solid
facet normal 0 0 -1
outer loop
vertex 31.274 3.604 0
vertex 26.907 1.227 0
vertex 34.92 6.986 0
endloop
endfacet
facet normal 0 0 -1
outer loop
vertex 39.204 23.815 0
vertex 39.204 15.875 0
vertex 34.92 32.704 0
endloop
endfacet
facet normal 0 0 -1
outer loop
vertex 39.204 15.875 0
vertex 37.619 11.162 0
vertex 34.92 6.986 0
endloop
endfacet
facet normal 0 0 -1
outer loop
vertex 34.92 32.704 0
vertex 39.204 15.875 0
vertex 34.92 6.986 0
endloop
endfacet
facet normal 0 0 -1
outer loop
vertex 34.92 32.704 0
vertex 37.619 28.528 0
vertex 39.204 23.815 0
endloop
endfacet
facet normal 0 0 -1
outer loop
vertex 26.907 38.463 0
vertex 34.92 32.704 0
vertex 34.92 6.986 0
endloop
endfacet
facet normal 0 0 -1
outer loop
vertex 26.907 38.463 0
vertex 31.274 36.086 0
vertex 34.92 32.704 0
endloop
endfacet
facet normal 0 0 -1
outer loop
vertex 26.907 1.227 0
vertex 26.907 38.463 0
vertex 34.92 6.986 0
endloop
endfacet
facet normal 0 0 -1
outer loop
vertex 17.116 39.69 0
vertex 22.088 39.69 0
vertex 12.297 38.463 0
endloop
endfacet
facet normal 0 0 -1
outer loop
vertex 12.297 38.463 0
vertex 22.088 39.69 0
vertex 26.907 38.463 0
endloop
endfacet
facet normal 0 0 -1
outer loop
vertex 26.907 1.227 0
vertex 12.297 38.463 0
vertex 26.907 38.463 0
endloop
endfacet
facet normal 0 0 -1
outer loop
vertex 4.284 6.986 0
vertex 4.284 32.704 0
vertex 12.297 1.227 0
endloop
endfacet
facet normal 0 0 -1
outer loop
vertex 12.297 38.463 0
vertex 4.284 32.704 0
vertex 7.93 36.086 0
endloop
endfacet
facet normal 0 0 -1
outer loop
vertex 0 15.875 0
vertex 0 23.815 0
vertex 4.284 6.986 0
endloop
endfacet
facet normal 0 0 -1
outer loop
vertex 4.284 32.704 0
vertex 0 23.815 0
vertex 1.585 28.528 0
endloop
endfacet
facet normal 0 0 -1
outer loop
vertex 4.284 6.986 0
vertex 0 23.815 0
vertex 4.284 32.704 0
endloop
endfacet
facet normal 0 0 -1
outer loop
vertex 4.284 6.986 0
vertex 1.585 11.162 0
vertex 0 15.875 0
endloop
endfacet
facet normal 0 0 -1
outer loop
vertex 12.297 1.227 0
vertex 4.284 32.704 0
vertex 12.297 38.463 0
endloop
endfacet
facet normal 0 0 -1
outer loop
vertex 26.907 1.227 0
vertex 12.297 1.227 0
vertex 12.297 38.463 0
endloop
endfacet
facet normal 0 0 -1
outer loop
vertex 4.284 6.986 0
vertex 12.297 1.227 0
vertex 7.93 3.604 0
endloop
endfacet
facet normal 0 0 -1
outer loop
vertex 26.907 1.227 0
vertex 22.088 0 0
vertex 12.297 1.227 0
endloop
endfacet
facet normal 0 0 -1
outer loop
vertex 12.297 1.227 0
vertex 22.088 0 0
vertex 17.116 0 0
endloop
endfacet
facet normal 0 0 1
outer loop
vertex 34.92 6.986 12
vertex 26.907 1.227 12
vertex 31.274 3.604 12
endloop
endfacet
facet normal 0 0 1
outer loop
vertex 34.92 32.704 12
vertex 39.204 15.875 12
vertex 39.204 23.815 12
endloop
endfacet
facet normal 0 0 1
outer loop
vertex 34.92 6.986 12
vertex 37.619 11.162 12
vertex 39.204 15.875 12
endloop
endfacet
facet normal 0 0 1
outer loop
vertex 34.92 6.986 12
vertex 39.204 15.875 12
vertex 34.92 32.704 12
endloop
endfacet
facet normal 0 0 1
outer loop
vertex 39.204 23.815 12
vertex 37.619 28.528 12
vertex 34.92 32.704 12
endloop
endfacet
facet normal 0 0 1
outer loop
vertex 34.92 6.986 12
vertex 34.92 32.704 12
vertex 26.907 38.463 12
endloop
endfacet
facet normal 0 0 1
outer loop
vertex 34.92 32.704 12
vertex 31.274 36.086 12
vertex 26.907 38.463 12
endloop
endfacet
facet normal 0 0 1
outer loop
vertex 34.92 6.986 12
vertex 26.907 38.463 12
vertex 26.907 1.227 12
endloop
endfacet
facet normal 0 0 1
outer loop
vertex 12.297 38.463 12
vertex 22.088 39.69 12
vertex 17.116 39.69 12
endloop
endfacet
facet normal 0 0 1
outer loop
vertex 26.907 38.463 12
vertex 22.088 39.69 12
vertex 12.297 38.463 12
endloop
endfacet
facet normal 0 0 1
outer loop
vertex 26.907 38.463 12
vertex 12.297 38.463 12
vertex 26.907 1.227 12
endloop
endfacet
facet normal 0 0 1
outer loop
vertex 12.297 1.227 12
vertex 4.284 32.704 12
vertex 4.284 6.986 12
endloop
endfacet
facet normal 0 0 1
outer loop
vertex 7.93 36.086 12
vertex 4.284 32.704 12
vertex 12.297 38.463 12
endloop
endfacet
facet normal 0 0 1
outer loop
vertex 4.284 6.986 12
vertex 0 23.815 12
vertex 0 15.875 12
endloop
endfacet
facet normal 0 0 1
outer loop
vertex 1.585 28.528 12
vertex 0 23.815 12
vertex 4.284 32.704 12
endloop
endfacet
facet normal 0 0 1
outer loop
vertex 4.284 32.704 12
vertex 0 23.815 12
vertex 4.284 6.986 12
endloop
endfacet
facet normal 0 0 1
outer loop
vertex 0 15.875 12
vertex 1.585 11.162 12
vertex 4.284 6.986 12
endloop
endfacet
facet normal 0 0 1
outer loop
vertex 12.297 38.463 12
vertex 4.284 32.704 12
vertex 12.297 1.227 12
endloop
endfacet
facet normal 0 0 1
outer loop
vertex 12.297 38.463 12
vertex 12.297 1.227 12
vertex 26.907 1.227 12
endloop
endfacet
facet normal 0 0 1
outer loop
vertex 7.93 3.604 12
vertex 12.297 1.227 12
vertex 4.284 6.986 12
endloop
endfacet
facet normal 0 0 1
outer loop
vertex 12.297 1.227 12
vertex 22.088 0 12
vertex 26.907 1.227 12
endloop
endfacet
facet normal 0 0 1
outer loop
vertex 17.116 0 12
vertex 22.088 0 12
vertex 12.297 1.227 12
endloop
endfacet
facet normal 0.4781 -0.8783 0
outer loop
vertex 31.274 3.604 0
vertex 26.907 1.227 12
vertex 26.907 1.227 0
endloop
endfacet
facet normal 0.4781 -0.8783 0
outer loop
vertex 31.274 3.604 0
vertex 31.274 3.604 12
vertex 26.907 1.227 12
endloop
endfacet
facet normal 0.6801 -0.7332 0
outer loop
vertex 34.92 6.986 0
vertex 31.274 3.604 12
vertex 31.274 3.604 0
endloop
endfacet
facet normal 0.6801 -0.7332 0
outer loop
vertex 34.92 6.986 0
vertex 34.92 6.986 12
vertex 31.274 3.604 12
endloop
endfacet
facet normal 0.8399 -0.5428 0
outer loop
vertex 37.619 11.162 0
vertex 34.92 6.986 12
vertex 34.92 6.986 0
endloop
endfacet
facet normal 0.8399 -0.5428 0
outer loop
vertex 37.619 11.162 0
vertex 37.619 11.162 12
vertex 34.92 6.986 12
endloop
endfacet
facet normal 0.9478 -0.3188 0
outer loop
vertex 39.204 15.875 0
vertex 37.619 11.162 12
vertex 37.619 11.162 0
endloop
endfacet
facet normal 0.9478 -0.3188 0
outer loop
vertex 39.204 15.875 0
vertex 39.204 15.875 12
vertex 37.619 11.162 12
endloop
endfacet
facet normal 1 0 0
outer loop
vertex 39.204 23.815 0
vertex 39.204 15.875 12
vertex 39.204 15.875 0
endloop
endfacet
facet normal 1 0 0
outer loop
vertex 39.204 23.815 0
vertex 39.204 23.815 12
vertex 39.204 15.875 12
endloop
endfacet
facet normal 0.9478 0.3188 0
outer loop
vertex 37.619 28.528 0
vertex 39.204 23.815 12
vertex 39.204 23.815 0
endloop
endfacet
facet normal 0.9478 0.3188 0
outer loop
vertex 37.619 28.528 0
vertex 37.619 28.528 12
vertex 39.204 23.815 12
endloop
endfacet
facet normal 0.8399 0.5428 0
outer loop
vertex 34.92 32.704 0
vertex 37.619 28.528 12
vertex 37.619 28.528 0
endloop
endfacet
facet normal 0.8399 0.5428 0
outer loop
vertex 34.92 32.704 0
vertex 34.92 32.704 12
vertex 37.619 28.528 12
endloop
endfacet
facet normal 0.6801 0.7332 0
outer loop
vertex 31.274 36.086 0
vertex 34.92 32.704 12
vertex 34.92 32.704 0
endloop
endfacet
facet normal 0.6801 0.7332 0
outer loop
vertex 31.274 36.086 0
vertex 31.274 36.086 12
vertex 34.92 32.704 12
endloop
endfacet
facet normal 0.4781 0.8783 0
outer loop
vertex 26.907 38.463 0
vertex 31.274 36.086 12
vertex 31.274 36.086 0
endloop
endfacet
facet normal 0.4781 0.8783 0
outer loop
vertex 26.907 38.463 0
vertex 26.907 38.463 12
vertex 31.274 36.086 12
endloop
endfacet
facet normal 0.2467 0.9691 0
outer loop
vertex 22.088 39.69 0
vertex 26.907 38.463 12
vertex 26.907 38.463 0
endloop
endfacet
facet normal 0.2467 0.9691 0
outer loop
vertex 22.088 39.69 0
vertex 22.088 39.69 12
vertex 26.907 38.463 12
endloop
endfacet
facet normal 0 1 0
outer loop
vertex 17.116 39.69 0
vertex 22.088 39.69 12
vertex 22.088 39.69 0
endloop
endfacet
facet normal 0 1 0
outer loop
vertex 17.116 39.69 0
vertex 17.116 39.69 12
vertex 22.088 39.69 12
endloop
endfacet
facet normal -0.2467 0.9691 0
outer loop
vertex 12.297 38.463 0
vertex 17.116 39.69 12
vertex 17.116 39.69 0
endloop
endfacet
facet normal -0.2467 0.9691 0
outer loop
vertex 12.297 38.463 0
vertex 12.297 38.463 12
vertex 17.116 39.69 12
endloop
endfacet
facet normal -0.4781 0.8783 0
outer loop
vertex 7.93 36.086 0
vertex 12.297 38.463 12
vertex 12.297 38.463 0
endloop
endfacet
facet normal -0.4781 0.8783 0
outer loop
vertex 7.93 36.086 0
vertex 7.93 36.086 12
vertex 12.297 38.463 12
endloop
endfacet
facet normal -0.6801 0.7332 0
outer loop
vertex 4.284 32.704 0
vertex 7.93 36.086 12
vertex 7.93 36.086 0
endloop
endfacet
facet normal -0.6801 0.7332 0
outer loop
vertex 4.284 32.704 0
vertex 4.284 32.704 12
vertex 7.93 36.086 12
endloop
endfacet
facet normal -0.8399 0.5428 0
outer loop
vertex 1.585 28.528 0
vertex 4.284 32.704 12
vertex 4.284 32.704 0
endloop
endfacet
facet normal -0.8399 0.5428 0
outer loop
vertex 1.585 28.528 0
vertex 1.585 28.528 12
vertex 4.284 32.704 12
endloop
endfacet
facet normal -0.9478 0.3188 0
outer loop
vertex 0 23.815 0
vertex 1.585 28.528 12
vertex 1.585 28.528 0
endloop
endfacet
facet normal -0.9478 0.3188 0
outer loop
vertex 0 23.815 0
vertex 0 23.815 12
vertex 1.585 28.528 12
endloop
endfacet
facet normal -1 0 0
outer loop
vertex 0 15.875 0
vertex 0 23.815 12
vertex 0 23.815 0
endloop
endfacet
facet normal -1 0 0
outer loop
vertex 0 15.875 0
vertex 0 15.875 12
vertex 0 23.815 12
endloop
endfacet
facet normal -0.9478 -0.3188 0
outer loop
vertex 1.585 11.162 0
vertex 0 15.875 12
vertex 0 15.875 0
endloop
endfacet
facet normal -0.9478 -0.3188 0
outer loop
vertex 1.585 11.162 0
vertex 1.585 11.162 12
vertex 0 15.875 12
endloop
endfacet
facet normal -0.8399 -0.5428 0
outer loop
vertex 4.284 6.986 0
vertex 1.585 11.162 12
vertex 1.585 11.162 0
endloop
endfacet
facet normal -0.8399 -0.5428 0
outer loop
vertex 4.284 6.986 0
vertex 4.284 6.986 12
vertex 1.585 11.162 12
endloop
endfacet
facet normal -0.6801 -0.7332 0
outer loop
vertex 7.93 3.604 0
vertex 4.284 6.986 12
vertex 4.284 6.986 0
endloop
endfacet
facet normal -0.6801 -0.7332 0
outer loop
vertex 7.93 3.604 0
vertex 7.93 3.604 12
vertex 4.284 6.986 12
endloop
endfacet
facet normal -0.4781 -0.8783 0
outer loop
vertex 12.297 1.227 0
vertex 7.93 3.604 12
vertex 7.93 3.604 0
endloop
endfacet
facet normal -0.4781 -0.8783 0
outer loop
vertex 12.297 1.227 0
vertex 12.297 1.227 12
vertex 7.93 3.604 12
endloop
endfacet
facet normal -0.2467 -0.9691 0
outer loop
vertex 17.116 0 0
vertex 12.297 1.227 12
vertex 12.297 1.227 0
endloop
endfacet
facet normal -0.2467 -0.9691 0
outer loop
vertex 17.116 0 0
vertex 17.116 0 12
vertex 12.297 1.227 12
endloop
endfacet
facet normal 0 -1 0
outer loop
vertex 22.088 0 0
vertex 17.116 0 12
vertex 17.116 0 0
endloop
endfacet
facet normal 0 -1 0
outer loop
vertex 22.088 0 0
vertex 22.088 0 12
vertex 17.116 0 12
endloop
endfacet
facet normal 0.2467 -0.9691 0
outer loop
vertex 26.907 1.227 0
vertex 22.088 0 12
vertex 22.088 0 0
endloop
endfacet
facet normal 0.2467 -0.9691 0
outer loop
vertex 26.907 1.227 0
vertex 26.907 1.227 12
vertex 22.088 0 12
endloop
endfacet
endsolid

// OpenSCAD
$fn = 32;

// ----------------------------------------------------------------------
// Flat adaptor: double_d, 12 mm thick
// ----------------------------------------------------------------------

// --- parameters (mm) ---
profile_height = 12;      // extrusion height
profile_points = 24;      // points of the closed outline

profile = [[39.204, 23.815], [37.619, 28.528], [34.92, 32.704], [31.274, 36.086], [26.907, 38.463], [22.088, 39.69], [17.116, 39.69], [12.297, 38.463], [7.93, 36.086], [4.284, 32.704], [1.585, 28.528], [0, 23.815], [0, 15.875], [1.585, 11.162], [4.284, 6.986], [7.93, 3.604], [12.297, 1.227], [17.116, 0], [22.088, 0], [26.907, 1.227], [31.274, 3.604], [34.92, 6.986], [37.619, 11.162], [39.204, 15.875]];  // single closed polygon, 24 points, counter clockwise

// --- the one profile operation ---
linear_extrude(height = profile_height) polygon(points = profile);
